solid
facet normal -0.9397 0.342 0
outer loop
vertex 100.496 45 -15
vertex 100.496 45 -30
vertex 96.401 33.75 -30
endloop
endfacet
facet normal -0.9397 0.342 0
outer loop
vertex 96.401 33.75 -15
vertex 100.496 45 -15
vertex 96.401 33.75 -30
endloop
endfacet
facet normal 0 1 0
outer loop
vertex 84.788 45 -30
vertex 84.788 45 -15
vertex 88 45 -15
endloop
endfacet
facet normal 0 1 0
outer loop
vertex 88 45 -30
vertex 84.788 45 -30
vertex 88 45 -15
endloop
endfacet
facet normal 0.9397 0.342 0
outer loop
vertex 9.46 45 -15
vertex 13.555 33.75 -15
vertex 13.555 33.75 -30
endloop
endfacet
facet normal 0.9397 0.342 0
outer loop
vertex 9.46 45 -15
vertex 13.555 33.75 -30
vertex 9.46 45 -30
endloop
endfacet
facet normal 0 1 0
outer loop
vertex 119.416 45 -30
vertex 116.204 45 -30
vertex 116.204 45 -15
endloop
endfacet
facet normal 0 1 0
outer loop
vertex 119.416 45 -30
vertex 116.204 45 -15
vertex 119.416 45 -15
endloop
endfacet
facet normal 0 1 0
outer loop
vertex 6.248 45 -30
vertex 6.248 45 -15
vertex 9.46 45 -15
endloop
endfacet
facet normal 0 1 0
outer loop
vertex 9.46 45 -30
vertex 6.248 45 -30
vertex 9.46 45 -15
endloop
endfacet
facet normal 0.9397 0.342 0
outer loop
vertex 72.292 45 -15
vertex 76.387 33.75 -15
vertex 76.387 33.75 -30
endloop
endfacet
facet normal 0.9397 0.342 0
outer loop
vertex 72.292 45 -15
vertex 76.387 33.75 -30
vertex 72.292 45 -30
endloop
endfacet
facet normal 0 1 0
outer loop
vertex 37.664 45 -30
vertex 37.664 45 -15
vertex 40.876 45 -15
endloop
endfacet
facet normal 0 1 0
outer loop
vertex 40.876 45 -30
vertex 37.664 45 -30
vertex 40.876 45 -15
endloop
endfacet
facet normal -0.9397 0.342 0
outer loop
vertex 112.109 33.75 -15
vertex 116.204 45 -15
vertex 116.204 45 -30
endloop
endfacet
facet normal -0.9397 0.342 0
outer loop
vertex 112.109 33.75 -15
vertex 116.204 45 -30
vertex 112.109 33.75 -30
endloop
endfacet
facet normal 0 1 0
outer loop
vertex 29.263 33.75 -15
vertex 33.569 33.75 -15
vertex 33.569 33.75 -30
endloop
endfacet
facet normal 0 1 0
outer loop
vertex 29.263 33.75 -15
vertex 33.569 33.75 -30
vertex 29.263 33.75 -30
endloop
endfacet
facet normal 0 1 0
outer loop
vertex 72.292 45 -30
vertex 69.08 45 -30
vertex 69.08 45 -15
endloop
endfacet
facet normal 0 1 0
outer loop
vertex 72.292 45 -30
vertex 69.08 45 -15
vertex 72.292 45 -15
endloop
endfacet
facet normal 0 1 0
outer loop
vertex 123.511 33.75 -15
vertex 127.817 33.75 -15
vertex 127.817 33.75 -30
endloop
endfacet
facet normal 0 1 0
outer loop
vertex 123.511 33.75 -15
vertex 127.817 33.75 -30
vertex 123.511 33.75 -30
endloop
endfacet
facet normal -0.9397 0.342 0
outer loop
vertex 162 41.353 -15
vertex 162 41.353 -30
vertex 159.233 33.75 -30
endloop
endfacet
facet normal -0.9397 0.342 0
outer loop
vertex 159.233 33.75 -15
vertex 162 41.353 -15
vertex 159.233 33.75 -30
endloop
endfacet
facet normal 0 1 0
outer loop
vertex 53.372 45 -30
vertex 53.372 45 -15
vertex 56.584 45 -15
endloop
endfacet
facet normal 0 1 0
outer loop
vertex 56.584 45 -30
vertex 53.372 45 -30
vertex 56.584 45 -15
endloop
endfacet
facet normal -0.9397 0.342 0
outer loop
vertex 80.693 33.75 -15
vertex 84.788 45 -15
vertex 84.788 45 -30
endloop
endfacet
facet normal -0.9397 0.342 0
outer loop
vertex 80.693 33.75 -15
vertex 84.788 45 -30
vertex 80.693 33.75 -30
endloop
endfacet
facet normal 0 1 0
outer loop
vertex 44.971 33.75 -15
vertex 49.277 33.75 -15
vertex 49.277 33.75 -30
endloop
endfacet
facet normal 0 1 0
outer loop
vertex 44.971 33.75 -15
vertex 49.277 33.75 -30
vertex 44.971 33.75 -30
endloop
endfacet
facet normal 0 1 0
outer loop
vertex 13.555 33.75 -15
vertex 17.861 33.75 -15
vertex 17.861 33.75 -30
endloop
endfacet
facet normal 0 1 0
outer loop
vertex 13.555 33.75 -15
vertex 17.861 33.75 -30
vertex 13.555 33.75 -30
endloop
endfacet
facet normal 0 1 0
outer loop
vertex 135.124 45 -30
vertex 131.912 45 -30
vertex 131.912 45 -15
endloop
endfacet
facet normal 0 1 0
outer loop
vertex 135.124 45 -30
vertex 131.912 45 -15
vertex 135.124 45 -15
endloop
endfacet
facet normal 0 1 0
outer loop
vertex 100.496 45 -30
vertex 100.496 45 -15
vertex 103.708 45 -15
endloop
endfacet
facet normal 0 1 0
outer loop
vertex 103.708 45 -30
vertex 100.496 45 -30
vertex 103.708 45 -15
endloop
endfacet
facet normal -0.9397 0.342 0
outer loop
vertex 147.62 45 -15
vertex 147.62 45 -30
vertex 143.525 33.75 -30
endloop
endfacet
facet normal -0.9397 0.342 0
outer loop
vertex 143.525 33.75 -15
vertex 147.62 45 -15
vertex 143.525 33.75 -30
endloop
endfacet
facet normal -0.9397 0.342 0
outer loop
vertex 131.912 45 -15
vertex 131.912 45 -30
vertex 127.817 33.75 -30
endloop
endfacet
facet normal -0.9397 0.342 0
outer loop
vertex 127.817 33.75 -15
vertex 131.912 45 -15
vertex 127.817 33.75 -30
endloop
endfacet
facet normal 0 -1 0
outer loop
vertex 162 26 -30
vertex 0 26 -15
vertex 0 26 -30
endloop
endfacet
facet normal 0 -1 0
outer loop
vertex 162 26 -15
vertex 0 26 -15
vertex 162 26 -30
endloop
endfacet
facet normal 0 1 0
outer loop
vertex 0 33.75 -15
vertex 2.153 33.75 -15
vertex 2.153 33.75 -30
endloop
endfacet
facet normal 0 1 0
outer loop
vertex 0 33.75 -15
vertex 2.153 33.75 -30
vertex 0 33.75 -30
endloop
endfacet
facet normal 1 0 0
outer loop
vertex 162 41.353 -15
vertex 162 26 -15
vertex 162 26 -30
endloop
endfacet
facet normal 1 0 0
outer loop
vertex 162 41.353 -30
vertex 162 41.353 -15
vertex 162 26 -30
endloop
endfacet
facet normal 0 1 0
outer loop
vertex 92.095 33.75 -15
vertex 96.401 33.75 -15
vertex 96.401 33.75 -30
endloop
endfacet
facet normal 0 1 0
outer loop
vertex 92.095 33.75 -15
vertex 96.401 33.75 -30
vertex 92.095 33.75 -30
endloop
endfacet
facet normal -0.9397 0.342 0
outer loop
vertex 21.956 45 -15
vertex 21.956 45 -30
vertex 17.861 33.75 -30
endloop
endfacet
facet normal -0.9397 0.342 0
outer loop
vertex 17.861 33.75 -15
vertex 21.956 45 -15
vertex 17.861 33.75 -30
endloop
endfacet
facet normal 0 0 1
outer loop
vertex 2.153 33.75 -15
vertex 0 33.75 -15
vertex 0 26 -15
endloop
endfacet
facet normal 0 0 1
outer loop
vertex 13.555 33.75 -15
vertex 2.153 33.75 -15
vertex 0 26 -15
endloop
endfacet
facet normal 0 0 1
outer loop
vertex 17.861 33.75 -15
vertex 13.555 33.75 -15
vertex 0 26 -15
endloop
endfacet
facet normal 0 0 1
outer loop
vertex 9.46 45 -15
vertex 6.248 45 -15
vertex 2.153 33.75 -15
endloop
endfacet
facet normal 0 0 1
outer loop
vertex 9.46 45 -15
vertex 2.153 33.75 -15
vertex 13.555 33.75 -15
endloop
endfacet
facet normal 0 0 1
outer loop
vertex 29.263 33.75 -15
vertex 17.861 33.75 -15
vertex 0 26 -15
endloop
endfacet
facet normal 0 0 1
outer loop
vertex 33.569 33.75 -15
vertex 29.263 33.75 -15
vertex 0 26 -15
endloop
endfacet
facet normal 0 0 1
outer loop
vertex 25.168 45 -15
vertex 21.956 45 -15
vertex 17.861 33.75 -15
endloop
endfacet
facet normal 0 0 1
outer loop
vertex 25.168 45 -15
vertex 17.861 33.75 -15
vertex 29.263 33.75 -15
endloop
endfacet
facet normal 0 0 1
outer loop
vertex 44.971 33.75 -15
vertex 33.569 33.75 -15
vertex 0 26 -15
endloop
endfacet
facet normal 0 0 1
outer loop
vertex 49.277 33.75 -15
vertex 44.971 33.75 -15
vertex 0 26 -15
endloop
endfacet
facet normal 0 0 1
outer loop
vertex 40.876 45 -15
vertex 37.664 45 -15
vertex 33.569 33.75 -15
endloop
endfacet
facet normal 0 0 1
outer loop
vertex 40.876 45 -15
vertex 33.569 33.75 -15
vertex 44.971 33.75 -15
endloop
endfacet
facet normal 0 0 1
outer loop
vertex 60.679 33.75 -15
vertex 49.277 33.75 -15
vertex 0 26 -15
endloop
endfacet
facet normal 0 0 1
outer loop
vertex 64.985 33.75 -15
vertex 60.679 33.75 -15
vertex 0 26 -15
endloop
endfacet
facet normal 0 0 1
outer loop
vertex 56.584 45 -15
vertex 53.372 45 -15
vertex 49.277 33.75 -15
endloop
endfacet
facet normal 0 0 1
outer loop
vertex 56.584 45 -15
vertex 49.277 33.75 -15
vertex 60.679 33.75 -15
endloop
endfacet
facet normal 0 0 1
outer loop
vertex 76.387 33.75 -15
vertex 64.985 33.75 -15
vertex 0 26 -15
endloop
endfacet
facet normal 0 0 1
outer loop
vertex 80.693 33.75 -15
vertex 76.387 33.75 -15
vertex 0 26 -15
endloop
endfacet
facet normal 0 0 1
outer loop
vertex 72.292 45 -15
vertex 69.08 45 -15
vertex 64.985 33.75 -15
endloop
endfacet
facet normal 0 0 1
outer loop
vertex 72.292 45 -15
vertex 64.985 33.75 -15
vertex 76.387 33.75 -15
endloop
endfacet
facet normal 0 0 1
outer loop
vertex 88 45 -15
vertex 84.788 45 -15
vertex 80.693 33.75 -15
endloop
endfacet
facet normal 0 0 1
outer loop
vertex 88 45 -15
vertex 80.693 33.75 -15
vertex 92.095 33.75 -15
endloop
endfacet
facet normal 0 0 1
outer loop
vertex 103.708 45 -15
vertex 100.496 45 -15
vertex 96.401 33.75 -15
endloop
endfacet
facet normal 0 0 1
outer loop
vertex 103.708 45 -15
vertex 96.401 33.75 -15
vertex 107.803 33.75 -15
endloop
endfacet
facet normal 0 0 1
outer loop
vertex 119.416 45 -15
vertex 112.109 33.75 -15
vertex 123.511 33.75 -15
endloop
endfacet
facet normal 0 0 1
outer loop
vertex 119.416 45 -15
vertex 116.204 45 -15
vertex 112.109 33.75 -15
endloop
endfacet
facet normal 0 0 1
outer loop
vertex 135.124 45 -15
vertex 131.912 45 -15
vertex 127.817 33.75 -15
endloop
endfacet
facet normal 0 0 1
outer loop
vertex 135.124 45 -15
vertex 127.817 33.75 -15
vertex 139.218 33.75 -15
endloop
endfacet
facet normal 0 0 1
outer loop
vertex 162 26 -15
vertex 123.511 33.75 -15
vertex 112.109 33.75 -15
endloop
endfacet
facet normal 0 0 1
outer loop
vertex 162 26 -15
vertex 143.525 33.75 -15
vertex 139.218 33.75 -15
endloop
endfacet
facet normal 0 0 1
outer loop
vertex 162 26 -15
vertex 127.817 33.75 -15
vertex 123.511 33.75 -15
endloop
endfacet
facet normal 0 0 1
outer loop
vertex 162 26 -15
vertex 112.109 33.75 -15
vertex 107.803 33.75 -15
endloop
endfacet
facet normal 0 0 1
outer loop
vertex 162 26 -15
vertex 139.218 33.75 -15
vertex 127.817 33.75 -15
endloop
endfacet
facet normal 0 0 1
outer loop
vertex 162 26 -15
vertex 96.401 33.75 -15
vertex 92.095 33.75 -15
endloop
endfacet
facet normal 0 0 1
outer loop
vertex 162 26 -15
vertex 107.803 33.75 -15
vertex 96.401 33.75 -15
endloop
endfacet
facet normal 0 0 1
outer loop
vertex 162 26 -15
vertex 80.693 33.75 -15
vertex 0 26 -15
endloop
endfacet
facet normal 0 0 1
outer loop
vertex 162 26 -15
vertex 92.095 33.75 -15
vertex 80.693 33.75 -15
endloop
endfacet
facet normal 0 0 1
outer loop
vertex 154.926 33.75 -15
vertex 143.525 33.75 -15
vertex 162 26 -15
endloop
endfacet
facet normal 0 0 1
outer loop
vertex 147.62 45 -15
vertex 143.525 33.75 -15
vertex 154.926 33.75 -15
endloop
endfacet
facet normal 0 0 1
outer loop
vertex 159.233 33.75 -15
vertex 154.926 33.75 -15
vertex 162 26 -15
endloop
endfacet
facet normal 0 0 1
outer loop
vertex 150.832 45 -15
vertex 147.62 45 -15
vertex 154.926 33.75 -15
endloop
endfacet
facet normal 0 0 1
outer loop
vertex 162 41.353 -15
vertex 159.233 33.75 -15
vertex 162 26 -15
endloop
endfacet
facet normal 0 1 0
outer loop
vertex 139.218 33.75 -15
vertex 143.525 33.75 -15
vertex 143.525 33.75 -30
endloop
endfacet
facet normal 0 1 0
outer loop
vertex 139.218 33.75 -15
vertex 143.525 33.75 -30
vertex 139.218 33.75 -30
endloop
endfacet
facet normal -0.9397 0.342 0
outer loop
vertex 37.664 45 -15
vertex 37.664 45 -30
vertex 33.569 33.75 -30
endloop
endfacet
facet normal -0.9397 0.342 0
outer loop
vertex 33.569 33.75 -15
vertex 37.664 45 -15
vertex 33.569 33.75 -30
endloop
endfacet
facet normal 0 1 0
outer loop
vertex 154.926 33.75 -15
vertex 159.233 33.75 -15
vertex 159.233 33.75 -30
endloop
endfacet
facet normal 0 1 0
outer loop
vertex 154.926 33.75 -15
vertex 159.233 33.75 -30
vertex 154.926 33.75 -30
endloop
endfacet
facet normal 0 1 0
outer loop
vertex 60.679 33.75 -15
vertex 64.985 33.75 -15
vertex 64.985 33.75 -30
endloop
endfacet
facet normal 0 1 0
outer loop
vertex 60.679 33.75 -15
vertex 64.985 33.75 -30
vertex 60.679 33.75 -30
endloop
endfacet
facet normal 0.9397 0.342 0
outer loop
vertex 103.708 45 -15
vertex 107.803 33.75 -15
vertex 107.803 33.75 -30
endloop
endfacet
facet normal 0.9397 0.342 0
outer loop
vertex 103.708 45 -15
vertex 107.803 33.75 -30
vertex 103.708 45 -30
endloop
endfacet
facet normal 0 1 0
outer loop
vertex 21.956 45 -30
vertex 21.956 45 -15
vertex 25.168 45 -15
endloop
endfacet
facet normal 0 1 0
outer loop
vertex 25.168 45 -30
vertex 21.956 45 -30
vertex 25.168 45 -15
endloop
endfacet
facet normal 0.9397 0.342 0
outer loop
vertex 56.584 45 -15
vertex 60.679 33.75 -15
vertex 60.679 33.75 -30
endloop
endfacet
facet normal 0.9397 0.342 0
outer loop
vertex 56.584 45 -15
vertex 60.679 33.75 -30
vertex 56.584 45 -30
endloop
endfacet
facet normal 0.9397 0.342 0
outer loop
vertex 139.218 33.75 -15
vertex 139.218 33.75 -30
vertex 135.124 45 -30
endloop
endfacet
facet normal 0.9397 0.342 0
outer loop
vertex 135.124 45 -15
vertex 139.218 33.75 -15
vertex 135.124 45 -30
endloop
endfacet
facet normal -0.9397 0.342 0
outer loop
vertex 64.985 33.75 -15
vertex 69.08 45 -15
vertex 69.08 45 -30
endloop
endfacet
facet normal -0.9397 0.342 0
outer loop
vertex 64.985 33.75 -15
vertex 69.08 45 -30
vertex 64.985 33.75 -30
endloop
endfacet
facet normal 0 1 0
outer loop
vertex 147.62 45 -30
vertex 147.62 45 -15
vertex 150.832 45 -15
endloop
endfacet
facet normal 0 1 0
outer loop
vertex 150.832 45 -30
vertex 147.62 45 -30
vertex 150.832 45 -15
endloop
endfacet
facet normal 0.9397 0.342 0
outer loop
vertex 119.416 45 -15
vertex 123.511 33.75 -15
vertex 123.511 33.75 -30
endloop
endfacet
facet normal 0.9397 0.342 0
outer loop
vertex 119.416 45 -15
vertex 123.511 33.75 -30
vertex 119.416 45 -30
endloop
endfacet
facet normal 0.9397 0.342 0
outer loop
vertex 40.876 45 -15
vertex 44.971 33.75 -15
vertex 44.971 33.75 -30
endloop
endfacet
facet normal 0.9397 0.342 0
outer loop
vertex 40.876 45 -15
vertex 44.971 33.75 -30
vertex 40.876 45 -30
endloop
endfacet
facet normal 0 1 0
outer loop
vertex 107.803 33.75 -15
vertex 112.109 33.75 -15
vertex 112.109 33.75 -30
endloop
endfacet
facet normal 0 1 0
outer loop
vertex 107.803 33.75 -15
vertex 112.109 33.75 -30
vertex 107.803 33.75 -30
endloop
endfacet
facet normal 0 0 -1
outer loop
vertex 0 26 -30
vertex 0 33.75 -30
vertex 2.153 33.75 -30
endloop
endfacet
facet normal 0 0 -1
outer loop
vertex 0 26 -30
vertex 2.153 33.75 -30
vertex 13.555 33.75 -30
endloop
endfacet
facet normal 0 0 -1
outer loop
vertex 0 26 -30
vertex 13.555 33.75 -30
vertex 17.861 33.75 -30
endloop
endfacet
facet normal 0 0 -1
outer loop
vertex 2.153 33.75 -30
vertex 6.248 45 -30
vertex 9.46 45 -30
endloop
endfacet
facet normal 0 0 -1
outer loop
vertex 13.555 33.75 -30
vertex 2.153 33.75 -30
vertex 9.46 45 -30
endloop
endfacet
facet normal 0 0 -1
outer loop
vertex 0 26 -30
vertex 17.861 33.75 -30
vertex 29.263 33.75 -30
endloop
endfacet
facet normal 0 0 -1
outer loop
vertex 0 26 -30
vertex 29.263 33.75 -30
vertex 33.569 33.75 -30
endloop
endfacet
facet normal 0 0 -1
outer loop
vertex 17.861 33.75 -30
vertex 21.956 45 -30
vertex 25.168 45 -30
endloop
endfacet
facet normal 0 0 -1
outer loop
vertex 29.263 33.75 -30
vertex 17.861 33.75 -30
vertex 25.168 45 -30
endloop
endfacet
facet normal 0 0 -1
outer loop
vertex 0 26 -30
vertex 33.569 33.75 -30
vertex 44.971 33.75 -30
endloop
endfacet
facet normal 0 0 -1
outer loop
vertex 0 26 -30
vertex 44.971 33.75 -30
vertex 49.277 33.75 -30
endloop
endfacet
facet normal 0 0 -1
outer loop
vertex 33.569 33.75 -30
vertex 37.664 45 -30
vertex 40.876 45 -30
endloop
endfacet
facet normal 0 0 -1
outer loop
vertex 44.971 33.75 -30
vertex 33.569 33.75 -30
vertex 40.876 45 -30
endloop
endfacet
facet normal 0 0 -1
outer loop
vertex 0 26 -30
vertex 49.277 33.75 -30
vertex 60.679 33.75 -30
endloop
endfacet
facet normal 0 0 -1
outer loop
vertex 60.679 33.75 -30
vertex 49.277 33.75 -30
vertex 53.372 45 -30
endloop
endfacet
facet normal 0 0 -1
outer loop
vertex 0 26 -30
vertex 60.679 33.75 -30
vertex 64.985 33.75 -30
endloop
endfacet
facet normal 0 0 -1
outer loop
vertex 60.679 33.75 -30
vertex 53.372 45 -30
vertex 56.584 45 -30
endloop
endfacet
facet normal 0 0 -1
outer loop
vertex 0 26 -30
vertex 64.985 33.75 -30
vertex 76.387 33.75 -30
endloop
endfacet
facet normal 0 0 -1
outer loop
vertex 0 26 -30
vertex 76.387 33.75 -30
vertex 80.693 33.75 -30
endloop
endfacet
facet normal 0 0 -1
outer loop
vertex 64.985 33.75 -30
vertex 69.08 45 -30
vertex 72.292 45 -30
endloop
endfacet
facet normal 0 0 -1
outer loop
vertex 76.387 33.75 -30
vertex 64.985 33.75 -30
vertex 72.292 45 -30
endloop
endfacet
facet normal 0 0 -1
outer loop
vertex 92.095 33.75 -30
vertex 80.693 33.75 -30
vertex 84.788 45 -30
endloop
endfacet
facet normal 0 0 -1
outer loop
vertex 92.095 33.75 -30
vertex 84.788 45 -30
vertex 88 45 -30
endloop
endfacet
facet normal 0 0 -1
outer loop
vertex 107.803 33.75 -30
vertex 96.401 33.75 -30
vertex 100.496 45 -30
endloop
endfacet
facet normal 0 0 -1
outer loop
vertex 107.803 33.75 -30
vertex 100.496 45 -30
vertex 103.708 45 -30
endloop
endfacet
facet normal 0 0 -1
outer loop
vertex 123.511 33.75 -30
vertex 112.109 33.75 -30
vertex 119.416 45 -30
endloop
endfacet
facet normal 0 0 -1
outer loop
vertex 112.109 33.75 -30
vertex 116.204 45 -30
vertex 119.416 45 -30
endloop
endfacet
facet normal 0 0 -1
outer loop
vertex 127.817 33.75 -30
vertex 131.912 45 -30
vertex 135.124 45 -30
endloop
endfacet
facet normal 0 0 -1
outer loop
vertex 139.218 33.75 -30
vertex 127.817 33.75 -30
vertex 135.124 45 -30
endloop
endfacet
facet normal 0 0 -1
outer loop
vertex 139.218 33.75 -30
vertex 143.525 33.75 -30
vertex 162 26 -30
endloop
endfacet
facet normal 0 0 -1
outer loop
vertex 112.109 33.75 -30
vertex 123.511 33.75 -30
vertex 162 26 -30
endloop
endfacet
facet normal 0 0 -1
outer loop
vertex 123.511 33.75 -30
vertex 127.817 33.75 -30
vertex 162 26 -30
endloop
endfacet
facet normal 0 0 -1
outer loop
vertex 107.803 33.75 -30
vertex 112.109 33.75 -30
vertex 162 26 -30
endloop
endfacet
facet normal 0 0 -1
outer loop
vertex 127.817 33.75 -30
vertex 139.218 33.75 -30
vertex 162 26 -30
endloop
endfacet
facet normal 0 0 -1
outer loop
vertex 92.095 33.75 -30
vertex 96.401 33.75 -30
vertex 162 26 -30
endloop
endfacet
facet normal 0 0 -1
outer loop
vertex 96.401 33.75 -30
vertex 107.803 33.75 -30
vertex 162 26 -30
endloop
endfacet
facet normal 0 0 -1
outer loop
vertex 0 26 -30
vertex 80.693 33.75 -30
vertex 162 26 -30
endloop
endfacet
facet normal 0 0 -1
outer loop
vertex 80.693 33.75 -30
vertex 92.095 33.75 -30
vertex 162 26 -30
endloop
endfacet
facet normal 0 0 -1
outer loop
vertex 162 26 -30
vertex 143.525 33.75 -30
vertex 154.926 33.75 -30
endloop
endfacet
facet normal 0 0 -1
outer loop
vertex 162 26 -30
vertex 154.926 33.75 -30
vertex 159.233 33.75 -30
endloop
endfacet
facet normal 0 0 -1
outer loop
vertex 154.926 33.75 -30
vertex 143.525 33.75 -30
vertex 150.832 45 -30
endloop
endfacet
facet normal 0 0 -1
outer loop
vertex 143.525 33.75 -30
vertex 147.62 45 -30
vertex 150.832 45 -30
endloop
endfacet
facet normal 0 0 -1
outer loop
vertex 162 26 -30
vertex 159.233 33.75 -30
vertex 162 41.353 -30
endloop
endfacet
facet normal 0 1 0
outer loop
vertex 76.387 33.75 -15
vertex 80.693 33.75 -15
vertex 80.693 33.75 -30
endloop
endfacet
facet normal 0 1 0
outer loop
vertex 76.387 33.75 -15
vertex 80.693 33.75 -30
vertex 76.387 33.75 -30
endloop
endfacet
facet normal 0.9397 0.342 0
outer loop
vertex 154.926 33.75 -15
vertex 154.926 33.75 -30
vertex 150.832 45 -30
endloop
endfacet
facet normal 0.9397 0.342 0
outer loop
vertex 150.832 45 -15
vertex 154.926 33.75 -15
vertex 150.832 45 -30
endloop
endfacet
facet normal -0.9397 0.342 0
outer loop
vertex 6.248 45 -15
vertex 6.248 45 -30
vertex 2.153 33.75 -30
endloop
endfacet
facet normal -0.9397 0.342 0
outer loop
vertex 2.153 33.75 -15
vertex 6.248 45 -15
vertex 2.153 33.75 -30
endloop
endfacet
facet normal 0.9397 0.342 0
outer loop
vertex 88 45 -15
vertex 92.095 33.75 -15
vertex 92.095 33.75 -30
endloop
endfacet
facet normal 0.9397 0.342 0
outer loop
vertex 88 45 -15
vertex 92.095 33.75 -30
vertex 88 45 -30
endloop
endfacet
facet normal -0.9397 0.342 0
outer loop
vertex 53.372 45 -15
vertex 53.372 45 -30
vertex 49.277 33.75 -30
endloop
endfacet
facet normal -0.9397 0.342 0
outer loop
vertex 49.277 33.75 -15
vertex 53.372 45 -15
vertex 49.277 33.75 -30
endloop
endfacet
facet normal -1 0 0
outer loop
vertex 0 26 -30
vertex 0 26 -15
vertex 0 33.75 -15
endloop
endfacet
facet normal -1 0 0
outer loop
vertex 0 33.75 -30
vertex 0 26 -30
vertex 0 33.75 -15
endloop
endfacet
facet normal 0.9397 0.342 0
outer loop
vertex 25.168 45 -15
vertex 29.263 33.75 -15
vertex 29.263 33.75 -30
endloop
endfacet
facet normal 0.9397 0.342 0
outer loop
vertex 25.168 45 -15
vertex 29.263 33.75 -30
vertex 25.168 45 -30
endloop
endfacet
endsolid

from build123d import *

# Parameters (mm, degrees)
BLANKSKE_W         = 300
BLANKSKE_H         = 45
BLANK_DEPTH        = 30
TOOTHCUTSIM_DEPTH  = 305.836021494
TEETHCUTS_COUNT    = 20
TEETHCUTS_PITCH    = 15.70796325
SKETCH1_W          = 305.531648247
SKETCH1_H          = 78.813182986
CUT_EXTRUDE1_DEPTH = 15
SKETCH2_W          = 303.838018684
SKETCH2_H          = 48.852788509
CUT_EXTRUDE2_DEPTH = 26
SKETCH3_W          = 15
SKETCH3_H          = 19
CUT_EXTRUDE3_DEPTH = 138


with BuildPart() as part:
    # BlankSke → Blank (new body)
    with BuildSketch(Plane.XY):
        with Locations((150, 22.5)):
            Rectangle(BLANKSKE_W, BLANKSKE_H)
    extrude(amount=-BLANK_DEPTH)

    # TooCutSkeSim → ToothCutSim (cut, through all)
    with BuildSketch(Plane.XY):
        Polygon((2.153176848, 33.75), (-2.153176848, 33.75), (-6.257086828, 45.0254), (6.257086828, 45.0254), align=None)
    toothcutsim = extrude(amount=-TOOTHCUTSIM_DEPTH, mode=Mode.SUBTRACT)

    # TeethCuts: ToothCutSim ×20
    with Locations(*[(i * TEETHCUTS_PITCH, 0, 0) for i in range(1, TEETHCUTS_COUNT)]):
        add(toothcutsim, mode=Mode.SUBTRACT)

    # Sketch1 → Cut-Extrude1 (cut)
    with BuildSketch(Plane.XY):
        with Locations((152.765824124, 39.406591493)):
            Rectangle(SKETCH1_W, SKETCH1_H)
    extrude(amount=-CUT_EXTRUDE1_DEPTH, mode=Mode.SUBTRACT)

    # Sketch2 → Cut-Extrude2 (cut)
    with BuildSketch(Plane.XZ):
        with Locations((151.919009342, -5.573605746)):
            Rectangle(SKETCH2_W, SKETCH2_H)
    extrude(amount=-CUT_EXTRUDE2_DEPTH, mode=Mode.SUBTRACT)

    # Sketch3 → Cut-Extrude3 (cut)
    with BuildSketch(Plane(origin=(300, 0, 0), x_dir=(0, 0, -1), z_dir=(1, 0, 0))):
        with Locations((22.5, 35.5)):
            Rectangle(SKETCH3_W, SKETCH3_H)
    extrude(amount=-CUT_EXTRUDE3_DEPTH, mode=Mode.SUBTRACT)


solid = part.part
